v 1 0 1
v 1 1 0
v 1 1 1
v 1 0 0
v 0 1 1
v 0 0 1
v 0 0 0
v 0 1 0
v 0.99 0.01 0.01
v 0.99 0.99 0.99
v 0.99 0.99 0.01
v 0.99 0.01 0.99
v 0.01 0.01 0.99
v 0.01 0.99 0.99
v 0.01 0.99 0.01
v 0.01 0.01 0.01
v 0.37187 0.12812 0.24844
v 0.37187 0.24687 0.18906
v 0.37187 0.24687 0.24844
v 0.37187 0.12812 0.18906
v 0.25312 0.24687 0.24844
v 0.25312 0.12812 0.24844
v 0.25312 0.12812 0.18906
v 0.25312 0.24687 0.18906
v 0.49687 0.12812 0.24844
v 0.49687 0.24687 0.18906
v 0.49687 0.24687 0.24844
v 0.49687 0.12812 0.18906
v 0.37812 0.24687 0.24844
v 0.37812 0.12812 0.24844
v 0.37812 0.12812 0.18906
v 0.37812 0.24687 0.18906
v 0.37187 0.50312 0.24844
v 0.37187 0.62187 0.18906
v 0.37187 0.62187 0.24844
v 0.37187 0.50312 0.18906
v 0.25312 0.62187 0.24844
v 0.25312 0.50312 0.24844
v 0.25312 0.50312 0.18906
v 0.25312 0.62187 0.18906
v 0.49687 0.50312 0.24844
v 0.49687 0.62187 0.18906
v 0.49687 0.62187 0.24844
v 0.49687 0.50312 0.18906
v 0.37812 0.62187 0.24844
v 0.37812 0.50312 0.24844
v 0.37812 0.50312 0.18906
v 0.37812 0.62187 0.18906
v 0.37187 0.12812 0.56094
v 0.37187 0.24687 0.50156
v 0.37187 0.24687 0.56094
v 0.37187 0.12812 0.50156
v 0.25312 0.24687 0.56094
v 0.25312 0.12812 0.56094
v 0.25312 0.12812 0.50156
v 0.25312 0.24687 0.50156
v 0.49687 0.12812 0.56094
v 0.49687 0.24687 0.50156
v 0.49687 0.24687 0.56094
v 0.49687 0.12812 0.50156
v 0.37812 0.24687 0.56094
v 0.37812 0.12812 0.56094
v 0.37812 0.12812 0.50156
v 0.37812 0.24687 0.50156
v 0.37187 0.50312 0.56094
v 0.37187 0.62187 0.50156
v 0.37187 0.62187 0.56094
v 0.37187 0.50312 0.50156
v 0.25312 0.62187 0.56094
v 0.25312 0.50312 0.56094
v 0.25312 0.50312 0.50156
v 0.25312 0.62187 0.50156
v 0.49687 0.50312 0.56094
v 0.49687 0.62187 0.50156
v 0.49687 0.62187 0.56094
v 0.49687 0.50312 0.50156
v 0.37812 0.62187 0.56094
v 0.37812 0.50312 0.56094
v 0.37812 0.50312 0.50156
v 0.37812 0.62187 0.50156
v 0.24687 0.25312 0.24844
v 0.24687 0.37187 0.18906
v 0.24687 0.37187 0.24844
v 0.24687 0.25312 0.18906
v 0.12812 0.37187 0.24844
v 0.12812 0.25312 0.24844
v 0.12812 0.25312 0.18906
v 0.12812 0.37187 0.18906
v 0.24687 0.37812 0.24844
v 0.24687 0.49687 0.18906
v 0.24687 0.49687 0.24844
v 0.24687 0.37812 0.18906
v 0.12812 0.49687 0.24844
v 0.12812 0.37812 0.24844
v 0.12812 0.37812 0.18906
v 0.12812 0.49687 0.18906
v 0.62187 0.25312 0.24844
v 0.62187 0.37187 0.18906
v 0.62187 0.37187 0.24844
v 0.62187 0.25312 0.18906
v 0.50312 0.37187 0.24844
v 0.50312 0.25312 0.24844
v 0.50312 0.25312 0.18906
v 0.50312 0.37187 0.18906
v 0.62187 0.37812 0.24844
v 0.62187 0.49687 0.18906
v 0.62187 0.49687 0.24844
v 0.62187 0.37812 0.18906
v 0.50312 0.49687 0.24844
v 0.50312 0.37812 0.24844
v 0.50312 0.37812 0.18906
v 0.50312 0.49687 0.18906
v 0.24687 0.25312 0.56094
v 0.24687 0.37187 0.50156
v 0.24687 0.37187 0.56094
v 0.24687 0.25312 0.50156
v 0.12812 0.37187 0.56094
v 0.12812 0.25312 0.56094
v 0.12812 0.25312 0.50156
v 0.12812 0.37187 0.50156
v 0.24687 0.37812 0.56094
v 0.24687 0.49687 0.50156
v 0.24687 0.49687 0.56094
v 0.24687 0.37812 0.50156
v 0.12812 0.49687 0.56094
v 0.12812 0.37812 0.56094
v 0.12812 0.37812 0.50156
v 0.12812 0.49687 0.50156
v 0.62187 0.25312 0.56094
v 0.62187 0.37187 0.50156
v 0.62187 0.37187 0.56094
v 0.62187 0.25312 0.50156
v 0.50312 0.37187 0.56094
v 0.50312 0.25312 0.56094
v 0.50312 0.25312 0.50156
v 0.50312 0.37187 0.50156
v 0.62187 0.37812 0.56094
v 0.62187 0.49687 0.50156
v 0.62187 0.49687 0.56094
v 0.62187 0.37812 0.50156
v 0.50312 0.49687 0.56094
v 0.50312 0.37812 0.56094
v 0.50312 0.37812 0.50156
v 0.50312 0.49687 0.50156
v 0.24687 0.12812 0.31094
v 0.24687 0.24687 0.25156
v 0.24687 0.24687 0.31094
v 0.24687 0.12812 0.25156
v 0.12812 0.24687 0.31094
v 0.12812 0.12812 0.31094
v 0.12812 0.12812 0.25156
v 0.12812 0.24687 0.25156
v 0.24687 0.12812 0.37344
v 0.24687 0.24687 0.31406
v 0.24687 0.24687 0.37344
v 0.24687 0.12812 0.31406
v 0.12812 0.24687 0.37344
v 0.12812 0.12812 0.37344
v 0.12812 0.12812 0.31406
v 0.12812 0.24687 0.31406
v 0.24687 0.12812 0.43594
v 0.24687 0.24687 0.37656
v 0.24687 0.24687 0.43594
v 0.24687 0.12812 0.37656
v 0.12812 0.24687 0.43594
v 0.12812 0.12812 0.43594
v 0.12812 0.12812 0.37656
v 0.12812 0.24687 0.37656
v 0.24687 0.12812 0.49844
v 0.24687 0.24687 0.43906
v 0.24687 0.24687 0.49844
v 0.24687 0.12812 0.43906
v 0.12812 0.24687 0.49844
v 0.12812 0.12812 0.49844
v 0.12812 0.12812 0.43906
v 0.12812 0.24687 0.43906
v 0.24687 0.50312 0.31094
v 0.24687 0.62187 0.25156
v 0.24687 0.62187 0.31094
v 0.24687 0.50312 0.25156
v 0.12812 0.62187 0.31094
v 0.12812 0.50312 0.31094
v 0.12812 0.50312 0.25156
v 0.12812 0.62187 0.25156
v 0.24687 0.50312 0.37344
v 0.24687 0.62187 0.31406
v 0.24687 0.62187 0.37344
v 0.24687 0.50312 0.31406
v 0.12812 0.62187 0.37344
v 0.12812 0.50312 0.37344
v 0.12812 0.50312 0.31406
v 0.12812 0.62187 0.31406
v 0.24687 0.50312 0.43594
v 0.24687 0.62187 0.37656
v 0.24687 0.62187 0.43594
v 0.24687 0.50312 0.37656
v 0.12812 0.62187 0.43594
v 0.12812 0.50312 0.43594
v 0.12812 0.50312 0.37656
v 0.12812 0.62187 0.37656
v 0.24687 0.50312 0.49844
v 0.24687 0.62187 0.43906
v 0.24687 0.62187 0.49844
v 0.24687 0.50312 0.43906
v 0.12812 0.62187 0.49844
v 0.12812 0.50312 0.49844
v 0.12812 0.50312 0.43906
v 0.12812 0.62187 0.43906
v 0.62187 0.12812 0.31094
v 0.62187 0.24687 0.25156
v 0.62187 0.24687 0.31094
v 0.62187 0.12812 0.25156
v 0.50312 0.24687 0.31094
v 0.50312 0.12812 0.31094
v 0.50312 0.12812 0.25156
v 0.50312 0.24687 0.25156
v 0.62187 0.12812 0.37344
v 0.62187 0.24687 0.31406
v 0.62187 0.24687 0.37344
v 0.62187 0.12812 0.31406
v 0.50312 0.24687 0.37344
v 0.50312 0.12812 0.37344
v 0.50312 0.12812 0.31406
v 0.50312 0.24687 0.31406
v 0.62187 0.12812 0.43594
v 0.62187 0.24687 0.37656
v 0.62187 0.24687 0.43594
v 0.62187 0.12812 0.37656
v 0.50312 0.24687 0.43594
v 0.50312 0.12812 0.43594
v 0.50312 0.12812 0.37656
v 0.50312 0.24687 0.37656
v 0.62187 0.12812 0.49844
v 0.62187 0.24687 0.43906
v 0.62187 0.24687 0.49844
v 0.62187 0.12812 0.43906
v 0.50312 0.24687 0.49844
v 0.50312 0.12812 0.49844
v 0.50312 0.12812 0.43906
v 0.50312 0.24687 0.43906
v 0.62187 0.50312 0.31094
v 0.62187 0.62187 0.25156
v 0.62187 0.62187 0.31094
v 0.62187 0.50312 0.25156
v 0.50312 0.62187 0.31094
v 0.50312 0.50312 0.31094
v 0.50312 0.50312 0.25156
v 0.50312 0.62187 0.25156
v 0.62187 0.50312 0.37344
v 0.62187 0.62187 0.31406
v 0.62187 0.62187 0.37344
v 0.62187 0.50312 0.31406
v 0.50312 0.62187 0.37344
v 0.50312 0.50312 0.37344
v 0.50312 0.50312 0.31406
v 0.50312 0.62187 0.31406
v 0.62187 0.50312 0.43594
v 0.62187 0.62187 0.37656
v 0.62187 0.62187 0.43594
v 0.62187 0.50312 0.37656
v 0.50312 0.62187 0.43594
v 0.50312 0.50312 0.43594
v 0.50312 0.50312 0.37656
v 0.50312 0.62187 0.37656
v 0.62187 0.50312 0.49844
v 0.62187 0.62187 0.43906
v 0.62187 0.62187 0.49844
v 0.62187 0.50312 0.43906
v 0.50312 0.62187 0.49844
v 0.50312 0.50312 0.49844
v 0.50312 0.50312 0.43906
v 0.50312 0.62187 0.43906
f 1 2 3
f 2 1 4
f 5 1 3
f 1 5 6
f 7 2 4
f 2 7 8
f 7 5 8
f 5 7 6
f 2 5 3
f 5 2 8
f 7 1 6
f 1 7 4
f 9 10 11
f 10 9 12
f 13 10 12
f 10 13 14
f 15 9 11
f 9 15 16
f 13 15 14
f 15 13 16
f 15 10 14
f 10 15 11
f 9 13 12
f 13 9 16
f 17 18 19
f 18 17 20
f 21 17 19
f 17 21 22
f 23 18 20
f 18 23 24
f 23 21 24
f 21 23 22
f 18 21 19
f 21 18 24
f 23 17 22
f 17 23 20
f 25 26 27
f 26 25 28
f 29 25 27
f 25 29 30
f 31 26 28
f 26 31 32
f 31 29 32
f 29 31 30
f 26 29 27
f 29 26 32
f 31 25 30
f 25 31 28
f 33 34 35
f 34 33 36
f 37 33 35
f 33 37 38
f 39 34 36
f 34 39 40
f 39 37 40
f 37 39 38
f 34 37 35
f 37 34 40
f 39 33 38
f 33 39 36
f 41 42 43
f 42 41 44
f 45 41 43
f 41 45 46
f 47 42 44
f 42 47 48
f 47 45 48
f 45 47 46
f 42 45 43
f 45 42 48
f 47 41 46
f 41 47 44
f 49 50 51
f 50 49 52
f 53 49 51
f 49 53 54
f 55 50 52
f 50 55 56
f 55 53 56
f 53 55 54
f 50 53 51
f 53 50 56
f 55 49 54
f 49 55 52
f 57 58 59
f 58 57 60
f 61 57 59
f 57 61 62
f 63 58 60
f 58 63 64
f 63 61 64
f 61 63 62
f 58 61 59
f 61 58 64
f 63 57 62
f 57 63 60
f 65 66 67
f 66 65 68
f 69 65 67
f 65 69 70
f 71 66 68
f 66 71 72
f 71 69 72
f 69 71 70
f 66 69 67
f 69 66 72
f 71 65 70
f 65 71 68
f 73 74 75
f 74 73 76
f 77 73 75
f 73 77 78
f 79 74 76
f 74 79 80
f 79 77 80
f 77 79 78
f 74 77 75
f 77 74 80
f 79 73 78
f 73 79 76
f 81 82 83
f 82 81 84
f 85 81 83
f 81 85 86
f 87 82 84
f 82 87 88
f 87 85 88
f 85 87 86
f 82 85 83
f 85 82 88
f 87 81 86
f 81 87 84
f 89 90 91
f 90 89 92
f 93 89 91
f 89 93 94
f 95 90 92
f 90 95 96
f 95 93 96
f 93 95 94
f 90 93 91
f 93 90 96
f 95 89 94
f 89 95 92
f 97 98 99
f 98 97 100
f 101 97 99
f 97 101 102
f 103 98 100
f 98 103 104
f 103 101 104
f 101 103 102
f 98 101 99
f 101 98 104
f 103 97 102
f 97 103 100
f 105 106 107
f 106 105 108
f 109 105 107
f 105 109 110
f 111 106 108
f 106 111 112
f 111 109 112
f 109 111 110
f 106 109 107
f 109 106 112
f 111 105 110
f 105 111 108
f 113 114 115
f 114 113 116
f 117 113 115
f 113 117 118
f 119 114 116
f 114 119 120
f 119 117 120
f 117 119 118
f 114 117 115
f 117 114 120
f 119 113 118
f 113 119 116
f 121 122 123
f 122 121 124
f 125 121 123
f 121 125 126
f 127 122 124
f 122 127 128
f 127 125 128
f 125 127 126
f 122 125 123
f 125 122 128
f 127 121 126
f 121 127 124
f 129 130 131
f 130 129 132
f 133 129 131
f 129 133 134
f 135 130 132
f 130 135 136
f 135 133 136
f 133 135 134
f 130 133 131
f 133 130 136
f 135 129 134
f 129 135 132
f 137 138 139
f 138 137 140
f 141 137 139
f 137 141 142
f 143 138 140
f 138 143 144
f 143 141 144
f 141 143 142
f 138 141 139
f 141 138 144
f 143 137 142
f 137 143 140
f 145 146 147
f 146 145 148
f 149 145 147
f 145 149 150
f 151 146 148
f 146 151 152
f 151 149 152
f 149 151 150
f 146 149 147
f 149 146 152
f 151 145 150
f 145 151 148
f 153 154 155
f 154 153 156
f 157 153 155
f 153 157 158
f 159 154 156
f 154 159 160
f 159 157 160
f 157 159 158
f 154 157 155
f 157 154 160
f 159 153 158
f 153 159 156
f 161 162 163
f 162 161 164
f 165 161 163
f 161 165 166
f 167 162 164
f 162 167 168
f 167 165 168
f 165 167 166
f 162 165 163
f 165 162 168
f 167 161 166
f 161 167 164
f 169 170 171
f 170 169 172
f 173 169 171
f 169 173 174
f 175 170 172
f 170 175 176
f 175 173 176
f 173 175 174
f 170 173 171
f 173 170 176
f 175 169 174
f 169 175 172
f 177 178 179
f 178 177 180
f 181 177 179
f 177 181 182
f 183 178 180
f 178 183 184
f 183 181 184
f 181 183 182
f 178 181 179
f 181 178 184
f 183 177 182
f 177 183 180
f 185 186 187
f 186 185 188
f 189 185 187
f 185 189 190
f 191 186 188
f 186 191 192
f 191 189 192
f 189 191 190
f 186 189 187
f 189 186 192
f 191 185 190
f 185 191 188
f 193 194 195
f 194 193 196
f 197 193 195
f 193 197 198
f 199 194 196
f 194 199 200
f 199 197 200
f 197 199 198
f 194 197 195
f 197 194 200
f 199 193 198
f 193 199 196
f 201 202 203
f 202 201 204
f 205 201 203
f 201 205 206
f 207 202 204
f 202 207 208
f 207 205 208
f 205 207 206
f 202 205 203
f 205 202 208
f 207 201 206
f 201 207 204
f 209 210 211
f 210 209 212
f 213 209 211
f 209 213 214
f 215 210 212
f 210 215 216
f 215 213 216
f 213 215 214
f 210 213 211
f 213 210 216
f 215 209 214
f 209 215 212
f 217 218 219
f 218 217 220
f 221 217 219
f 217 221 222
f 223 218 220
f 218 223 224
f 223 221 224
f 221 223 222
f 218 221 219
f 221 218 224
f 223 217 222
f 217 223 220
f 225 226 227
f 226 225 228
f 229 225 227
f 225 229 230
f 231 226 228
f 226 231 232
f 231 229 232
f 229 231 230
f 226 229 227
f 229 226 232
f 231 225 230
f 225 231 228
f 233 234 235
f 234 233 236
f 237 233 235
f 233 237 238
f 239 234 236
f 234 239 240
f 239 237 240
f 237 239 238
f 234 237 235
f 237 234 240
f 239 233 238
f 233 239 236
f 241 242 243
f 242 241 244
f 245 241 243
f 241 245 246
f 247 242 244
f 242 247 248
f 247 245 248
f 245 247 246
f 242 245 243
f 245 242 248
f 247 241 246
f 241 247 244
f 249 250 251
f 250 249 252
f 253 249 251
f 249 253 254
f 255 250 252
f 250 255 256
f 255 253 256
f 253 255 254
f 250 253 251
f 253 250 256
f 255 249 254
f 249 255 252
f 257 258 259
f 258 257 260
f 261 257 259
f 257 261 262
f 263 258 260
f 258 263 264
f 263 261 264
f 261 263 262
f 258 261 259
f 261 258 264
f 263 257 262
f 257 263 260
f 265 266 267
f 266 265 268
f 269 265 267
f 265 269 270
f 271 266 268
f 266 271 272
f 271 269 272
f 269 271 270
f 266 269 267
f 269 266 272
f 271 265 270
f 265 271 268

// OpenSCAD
translate([0.3125, 0.1875, 0.21875]) color([0.6927076060645895, 0.5293713766416016, 0.416562766711012]) cube([0.11875, 0.11875, 0.059375], center=true);
translate([0.4375, 0.1875, 0.21875]) color([0.7492783329832869, 0.6132276531107042, 0.30348609772171964]) cube([0.11875, 0.11875, 0.059375], center=true);
translate([0.3125, 0.5625, 0.21875]) color([0.5036000570739746, 0.8904791453625895, 0.7774341638940186]) cube([0.11875, 0.11875, 0.059375], center=true);
translate([0.4375, 0.5625, 0.21875]) color([0.12305674290517721, 0.9343758608644586, 0.5890177204736915]) cube([0.11875, 0.11875, 0.059375], center=true);
translate([0.3125, 0.1875, 0.53125]) color([0.6829845946198936, 0.8815306793408425, 0.3933693663972564]) cube([0.11875, 0.11875, 0.059375], center=true);
translate([0.4375, 0.1875, 0.53125]) color([0.016743222924452406, 0.24772397138329916, 0.8887376499083549]) cube([0.11875, 0.11875, 0.059375], center=true);
translate([0.3125, 0.5625, 0.53125]) color([0.5054826183673848, 0.5894551197205419, 0.6899402309991881]) cube([0.11875, 0.11875, 0.059375], center=true);
translate([0.4375, 0.5625, 0.53125]) color([0.9548409308901544, 0.25952127962735616, 0.6010252953496629]) cube([0.11875, 0.11875, 0.059375], center=true);
translate([0.1875, 0.3125, 0.21875]) color([0.7214489901719787, 0.5226726821231307, 0.12562612579753263]) cube([0.11875, 0.11875, 0.059375], center=true);
translate([0.1875, 0.4375, 0.21875]) color([0.7502834258818152, 0.4467791047745928, 0.5172749106803635]) cube([0.11875, 0.11875, 0.059375], center=true);
translate([0.5625, 0.3125, 0.21875]) color([0.4084144036276216, 0.3639583185479557, 0.6230441698690689]) cube([0.11875, 0.11875, 0.059375], center=true);
translate([0.5625, 0.4375, 0.21875]) color([0.25262539214104185, 0.7403324383274115, 0.8696624070436548]) cube([0.11875, 0.11875, 0.059375], center=true);
translate([0.1875, 0.3125, 0.53125]) color([0.12427406044209632, 0.792107233093216, 0.6718571758740649]) cube([0.11875, 0.11875, 0.059375], center=true);
translate([0.1875, 0.4375, 0.53125]) color([0.8144481241070598, 0.5490690359845272, 0.3638012661781035]) cube([0.11875, 0.11875, 0.059375], center=true);
translate([0.5625, 0.3125, 0.53125]) color([0.8066707160449309, 0.19284834274895846, 0.40669188403125367]) cube([0.11875, 0.11875, 0.059375], center=true);
translate([0.5625, 0.4375, 0.53125]) color([0.06816130811481058, 0.8741962585620829, 0.24533347300827413]) cube([0.11875, 0.11875, 0.059375], center=true);
translate([0.1875, 0.1875, 0.28125]) color([0.39380483444089986, 0.5888357970129098, 0.6850923435418]) cube([0.11875, 0.11875, 0.059375], center=true);
translate([0.1875, 0.1875, 0.34375]) color([0.6441506892201372, 0.07105491907612438, 0.9831998655772816]) cube([0.11875, 0.11875, 0.059375], center=true);
translate([0.1875, 0.1875, 0.40625]) color([0.0878839493779695, 0.35711882730086997, 0.16948228280508226]) cube([0.11875, 0.11875, 0.059375], center=true);
translate([0.1875, 0.1875, 0.46875]) color([0.24619812180046385, 0.22056882214878204, 0.21842879290190875]) cube([0.11875, 0.11875, 0.059375], center=true);
translate([0.1875, 0.5625, 0.28125]) color([0.32563264825619775, 0.809279713182336, 0.9512643759811122]) cube([0.11875, 0.11875, 0.059375], center=true);
translate([0.1875, 0.5625, 0.34375]) color([0.2625108577814449, 0.28101275279814864, 0.9804778641066161]) cube([0.11875, 0.11875, 0.059375], center=true);
translate([0.1875, 0.5625, 0.40625]) color([0.9910089569502445, 0.38583037751767735, 0.20968971845441664]) cube([0.11875, 0.11875, 0.059375], center=true);
translate([0.1875, 0.5625, 0.46875]) color([0.7775291655327318, 0.8645411587271407, 0.9312213344722304]) cube([0.11875, 0.11875, 0.059375], center=true);
translate([0.5625, 0.1875, 0.28125]) color([0.9617921545777791, 0.3385698126050295, 0.4611597808879746]) cube([0.11875, 0.11875, 0.059375], center=true);
translate([0.5625, 0.1875, 0.34375]) color([0.5843403116565506, 0.33659221019209107, 0.6869189551007763]) cube([0.11875, 0.11875, 0.059375], center=true);
translate([0.5625, 0.1875, 0.40625]) color([0.5924669092811183, 0.6101268252529465, 0.1683892821649563]) cube([0.11875, 0.11875, 0.059375], center=true);
translate([0.5625, 0.1875, 0.46875]) color([0.14923649933158745, 0.3647733167030215, 0.8004987112058729]) cube([0.11875, 0.11875, 0.059375], center=true);
translate([0.5625, 0.5625, 0.28125]) color([0.2353510463884535, 0.6714289384126718, 0.7345859145647304]) cube([0.11875, 0.11875, 0.059375], center=true);
translate([0.5625, 0.5625, 0.34375]) color([0.3706896630551032, 0.1491357545780272, 0.9133644482762974]) cube([0.11875, 0.11875, 0.059375], center=true);
translate([0.5625, 0.5625, 0.40625]) color([0.14828795676959905, 0.8099306132234418, 0.16162770826846207]) cube([0.11875, 0.11875, 0.059375], center=true);
translate([0.5625, 0.5625, 0.46875]) color([0.6616399154044569, 0.14227624722391852, 0.20864461929887335]) cube([0.11875, 0.11875, 0.059375], center=true);
color([0.3,0.3,0.3,0.3]) difference() { cube([1,1,1]); translate([0.01,0.01,0.01]) cube([0.98,0.98,0.98]); }
